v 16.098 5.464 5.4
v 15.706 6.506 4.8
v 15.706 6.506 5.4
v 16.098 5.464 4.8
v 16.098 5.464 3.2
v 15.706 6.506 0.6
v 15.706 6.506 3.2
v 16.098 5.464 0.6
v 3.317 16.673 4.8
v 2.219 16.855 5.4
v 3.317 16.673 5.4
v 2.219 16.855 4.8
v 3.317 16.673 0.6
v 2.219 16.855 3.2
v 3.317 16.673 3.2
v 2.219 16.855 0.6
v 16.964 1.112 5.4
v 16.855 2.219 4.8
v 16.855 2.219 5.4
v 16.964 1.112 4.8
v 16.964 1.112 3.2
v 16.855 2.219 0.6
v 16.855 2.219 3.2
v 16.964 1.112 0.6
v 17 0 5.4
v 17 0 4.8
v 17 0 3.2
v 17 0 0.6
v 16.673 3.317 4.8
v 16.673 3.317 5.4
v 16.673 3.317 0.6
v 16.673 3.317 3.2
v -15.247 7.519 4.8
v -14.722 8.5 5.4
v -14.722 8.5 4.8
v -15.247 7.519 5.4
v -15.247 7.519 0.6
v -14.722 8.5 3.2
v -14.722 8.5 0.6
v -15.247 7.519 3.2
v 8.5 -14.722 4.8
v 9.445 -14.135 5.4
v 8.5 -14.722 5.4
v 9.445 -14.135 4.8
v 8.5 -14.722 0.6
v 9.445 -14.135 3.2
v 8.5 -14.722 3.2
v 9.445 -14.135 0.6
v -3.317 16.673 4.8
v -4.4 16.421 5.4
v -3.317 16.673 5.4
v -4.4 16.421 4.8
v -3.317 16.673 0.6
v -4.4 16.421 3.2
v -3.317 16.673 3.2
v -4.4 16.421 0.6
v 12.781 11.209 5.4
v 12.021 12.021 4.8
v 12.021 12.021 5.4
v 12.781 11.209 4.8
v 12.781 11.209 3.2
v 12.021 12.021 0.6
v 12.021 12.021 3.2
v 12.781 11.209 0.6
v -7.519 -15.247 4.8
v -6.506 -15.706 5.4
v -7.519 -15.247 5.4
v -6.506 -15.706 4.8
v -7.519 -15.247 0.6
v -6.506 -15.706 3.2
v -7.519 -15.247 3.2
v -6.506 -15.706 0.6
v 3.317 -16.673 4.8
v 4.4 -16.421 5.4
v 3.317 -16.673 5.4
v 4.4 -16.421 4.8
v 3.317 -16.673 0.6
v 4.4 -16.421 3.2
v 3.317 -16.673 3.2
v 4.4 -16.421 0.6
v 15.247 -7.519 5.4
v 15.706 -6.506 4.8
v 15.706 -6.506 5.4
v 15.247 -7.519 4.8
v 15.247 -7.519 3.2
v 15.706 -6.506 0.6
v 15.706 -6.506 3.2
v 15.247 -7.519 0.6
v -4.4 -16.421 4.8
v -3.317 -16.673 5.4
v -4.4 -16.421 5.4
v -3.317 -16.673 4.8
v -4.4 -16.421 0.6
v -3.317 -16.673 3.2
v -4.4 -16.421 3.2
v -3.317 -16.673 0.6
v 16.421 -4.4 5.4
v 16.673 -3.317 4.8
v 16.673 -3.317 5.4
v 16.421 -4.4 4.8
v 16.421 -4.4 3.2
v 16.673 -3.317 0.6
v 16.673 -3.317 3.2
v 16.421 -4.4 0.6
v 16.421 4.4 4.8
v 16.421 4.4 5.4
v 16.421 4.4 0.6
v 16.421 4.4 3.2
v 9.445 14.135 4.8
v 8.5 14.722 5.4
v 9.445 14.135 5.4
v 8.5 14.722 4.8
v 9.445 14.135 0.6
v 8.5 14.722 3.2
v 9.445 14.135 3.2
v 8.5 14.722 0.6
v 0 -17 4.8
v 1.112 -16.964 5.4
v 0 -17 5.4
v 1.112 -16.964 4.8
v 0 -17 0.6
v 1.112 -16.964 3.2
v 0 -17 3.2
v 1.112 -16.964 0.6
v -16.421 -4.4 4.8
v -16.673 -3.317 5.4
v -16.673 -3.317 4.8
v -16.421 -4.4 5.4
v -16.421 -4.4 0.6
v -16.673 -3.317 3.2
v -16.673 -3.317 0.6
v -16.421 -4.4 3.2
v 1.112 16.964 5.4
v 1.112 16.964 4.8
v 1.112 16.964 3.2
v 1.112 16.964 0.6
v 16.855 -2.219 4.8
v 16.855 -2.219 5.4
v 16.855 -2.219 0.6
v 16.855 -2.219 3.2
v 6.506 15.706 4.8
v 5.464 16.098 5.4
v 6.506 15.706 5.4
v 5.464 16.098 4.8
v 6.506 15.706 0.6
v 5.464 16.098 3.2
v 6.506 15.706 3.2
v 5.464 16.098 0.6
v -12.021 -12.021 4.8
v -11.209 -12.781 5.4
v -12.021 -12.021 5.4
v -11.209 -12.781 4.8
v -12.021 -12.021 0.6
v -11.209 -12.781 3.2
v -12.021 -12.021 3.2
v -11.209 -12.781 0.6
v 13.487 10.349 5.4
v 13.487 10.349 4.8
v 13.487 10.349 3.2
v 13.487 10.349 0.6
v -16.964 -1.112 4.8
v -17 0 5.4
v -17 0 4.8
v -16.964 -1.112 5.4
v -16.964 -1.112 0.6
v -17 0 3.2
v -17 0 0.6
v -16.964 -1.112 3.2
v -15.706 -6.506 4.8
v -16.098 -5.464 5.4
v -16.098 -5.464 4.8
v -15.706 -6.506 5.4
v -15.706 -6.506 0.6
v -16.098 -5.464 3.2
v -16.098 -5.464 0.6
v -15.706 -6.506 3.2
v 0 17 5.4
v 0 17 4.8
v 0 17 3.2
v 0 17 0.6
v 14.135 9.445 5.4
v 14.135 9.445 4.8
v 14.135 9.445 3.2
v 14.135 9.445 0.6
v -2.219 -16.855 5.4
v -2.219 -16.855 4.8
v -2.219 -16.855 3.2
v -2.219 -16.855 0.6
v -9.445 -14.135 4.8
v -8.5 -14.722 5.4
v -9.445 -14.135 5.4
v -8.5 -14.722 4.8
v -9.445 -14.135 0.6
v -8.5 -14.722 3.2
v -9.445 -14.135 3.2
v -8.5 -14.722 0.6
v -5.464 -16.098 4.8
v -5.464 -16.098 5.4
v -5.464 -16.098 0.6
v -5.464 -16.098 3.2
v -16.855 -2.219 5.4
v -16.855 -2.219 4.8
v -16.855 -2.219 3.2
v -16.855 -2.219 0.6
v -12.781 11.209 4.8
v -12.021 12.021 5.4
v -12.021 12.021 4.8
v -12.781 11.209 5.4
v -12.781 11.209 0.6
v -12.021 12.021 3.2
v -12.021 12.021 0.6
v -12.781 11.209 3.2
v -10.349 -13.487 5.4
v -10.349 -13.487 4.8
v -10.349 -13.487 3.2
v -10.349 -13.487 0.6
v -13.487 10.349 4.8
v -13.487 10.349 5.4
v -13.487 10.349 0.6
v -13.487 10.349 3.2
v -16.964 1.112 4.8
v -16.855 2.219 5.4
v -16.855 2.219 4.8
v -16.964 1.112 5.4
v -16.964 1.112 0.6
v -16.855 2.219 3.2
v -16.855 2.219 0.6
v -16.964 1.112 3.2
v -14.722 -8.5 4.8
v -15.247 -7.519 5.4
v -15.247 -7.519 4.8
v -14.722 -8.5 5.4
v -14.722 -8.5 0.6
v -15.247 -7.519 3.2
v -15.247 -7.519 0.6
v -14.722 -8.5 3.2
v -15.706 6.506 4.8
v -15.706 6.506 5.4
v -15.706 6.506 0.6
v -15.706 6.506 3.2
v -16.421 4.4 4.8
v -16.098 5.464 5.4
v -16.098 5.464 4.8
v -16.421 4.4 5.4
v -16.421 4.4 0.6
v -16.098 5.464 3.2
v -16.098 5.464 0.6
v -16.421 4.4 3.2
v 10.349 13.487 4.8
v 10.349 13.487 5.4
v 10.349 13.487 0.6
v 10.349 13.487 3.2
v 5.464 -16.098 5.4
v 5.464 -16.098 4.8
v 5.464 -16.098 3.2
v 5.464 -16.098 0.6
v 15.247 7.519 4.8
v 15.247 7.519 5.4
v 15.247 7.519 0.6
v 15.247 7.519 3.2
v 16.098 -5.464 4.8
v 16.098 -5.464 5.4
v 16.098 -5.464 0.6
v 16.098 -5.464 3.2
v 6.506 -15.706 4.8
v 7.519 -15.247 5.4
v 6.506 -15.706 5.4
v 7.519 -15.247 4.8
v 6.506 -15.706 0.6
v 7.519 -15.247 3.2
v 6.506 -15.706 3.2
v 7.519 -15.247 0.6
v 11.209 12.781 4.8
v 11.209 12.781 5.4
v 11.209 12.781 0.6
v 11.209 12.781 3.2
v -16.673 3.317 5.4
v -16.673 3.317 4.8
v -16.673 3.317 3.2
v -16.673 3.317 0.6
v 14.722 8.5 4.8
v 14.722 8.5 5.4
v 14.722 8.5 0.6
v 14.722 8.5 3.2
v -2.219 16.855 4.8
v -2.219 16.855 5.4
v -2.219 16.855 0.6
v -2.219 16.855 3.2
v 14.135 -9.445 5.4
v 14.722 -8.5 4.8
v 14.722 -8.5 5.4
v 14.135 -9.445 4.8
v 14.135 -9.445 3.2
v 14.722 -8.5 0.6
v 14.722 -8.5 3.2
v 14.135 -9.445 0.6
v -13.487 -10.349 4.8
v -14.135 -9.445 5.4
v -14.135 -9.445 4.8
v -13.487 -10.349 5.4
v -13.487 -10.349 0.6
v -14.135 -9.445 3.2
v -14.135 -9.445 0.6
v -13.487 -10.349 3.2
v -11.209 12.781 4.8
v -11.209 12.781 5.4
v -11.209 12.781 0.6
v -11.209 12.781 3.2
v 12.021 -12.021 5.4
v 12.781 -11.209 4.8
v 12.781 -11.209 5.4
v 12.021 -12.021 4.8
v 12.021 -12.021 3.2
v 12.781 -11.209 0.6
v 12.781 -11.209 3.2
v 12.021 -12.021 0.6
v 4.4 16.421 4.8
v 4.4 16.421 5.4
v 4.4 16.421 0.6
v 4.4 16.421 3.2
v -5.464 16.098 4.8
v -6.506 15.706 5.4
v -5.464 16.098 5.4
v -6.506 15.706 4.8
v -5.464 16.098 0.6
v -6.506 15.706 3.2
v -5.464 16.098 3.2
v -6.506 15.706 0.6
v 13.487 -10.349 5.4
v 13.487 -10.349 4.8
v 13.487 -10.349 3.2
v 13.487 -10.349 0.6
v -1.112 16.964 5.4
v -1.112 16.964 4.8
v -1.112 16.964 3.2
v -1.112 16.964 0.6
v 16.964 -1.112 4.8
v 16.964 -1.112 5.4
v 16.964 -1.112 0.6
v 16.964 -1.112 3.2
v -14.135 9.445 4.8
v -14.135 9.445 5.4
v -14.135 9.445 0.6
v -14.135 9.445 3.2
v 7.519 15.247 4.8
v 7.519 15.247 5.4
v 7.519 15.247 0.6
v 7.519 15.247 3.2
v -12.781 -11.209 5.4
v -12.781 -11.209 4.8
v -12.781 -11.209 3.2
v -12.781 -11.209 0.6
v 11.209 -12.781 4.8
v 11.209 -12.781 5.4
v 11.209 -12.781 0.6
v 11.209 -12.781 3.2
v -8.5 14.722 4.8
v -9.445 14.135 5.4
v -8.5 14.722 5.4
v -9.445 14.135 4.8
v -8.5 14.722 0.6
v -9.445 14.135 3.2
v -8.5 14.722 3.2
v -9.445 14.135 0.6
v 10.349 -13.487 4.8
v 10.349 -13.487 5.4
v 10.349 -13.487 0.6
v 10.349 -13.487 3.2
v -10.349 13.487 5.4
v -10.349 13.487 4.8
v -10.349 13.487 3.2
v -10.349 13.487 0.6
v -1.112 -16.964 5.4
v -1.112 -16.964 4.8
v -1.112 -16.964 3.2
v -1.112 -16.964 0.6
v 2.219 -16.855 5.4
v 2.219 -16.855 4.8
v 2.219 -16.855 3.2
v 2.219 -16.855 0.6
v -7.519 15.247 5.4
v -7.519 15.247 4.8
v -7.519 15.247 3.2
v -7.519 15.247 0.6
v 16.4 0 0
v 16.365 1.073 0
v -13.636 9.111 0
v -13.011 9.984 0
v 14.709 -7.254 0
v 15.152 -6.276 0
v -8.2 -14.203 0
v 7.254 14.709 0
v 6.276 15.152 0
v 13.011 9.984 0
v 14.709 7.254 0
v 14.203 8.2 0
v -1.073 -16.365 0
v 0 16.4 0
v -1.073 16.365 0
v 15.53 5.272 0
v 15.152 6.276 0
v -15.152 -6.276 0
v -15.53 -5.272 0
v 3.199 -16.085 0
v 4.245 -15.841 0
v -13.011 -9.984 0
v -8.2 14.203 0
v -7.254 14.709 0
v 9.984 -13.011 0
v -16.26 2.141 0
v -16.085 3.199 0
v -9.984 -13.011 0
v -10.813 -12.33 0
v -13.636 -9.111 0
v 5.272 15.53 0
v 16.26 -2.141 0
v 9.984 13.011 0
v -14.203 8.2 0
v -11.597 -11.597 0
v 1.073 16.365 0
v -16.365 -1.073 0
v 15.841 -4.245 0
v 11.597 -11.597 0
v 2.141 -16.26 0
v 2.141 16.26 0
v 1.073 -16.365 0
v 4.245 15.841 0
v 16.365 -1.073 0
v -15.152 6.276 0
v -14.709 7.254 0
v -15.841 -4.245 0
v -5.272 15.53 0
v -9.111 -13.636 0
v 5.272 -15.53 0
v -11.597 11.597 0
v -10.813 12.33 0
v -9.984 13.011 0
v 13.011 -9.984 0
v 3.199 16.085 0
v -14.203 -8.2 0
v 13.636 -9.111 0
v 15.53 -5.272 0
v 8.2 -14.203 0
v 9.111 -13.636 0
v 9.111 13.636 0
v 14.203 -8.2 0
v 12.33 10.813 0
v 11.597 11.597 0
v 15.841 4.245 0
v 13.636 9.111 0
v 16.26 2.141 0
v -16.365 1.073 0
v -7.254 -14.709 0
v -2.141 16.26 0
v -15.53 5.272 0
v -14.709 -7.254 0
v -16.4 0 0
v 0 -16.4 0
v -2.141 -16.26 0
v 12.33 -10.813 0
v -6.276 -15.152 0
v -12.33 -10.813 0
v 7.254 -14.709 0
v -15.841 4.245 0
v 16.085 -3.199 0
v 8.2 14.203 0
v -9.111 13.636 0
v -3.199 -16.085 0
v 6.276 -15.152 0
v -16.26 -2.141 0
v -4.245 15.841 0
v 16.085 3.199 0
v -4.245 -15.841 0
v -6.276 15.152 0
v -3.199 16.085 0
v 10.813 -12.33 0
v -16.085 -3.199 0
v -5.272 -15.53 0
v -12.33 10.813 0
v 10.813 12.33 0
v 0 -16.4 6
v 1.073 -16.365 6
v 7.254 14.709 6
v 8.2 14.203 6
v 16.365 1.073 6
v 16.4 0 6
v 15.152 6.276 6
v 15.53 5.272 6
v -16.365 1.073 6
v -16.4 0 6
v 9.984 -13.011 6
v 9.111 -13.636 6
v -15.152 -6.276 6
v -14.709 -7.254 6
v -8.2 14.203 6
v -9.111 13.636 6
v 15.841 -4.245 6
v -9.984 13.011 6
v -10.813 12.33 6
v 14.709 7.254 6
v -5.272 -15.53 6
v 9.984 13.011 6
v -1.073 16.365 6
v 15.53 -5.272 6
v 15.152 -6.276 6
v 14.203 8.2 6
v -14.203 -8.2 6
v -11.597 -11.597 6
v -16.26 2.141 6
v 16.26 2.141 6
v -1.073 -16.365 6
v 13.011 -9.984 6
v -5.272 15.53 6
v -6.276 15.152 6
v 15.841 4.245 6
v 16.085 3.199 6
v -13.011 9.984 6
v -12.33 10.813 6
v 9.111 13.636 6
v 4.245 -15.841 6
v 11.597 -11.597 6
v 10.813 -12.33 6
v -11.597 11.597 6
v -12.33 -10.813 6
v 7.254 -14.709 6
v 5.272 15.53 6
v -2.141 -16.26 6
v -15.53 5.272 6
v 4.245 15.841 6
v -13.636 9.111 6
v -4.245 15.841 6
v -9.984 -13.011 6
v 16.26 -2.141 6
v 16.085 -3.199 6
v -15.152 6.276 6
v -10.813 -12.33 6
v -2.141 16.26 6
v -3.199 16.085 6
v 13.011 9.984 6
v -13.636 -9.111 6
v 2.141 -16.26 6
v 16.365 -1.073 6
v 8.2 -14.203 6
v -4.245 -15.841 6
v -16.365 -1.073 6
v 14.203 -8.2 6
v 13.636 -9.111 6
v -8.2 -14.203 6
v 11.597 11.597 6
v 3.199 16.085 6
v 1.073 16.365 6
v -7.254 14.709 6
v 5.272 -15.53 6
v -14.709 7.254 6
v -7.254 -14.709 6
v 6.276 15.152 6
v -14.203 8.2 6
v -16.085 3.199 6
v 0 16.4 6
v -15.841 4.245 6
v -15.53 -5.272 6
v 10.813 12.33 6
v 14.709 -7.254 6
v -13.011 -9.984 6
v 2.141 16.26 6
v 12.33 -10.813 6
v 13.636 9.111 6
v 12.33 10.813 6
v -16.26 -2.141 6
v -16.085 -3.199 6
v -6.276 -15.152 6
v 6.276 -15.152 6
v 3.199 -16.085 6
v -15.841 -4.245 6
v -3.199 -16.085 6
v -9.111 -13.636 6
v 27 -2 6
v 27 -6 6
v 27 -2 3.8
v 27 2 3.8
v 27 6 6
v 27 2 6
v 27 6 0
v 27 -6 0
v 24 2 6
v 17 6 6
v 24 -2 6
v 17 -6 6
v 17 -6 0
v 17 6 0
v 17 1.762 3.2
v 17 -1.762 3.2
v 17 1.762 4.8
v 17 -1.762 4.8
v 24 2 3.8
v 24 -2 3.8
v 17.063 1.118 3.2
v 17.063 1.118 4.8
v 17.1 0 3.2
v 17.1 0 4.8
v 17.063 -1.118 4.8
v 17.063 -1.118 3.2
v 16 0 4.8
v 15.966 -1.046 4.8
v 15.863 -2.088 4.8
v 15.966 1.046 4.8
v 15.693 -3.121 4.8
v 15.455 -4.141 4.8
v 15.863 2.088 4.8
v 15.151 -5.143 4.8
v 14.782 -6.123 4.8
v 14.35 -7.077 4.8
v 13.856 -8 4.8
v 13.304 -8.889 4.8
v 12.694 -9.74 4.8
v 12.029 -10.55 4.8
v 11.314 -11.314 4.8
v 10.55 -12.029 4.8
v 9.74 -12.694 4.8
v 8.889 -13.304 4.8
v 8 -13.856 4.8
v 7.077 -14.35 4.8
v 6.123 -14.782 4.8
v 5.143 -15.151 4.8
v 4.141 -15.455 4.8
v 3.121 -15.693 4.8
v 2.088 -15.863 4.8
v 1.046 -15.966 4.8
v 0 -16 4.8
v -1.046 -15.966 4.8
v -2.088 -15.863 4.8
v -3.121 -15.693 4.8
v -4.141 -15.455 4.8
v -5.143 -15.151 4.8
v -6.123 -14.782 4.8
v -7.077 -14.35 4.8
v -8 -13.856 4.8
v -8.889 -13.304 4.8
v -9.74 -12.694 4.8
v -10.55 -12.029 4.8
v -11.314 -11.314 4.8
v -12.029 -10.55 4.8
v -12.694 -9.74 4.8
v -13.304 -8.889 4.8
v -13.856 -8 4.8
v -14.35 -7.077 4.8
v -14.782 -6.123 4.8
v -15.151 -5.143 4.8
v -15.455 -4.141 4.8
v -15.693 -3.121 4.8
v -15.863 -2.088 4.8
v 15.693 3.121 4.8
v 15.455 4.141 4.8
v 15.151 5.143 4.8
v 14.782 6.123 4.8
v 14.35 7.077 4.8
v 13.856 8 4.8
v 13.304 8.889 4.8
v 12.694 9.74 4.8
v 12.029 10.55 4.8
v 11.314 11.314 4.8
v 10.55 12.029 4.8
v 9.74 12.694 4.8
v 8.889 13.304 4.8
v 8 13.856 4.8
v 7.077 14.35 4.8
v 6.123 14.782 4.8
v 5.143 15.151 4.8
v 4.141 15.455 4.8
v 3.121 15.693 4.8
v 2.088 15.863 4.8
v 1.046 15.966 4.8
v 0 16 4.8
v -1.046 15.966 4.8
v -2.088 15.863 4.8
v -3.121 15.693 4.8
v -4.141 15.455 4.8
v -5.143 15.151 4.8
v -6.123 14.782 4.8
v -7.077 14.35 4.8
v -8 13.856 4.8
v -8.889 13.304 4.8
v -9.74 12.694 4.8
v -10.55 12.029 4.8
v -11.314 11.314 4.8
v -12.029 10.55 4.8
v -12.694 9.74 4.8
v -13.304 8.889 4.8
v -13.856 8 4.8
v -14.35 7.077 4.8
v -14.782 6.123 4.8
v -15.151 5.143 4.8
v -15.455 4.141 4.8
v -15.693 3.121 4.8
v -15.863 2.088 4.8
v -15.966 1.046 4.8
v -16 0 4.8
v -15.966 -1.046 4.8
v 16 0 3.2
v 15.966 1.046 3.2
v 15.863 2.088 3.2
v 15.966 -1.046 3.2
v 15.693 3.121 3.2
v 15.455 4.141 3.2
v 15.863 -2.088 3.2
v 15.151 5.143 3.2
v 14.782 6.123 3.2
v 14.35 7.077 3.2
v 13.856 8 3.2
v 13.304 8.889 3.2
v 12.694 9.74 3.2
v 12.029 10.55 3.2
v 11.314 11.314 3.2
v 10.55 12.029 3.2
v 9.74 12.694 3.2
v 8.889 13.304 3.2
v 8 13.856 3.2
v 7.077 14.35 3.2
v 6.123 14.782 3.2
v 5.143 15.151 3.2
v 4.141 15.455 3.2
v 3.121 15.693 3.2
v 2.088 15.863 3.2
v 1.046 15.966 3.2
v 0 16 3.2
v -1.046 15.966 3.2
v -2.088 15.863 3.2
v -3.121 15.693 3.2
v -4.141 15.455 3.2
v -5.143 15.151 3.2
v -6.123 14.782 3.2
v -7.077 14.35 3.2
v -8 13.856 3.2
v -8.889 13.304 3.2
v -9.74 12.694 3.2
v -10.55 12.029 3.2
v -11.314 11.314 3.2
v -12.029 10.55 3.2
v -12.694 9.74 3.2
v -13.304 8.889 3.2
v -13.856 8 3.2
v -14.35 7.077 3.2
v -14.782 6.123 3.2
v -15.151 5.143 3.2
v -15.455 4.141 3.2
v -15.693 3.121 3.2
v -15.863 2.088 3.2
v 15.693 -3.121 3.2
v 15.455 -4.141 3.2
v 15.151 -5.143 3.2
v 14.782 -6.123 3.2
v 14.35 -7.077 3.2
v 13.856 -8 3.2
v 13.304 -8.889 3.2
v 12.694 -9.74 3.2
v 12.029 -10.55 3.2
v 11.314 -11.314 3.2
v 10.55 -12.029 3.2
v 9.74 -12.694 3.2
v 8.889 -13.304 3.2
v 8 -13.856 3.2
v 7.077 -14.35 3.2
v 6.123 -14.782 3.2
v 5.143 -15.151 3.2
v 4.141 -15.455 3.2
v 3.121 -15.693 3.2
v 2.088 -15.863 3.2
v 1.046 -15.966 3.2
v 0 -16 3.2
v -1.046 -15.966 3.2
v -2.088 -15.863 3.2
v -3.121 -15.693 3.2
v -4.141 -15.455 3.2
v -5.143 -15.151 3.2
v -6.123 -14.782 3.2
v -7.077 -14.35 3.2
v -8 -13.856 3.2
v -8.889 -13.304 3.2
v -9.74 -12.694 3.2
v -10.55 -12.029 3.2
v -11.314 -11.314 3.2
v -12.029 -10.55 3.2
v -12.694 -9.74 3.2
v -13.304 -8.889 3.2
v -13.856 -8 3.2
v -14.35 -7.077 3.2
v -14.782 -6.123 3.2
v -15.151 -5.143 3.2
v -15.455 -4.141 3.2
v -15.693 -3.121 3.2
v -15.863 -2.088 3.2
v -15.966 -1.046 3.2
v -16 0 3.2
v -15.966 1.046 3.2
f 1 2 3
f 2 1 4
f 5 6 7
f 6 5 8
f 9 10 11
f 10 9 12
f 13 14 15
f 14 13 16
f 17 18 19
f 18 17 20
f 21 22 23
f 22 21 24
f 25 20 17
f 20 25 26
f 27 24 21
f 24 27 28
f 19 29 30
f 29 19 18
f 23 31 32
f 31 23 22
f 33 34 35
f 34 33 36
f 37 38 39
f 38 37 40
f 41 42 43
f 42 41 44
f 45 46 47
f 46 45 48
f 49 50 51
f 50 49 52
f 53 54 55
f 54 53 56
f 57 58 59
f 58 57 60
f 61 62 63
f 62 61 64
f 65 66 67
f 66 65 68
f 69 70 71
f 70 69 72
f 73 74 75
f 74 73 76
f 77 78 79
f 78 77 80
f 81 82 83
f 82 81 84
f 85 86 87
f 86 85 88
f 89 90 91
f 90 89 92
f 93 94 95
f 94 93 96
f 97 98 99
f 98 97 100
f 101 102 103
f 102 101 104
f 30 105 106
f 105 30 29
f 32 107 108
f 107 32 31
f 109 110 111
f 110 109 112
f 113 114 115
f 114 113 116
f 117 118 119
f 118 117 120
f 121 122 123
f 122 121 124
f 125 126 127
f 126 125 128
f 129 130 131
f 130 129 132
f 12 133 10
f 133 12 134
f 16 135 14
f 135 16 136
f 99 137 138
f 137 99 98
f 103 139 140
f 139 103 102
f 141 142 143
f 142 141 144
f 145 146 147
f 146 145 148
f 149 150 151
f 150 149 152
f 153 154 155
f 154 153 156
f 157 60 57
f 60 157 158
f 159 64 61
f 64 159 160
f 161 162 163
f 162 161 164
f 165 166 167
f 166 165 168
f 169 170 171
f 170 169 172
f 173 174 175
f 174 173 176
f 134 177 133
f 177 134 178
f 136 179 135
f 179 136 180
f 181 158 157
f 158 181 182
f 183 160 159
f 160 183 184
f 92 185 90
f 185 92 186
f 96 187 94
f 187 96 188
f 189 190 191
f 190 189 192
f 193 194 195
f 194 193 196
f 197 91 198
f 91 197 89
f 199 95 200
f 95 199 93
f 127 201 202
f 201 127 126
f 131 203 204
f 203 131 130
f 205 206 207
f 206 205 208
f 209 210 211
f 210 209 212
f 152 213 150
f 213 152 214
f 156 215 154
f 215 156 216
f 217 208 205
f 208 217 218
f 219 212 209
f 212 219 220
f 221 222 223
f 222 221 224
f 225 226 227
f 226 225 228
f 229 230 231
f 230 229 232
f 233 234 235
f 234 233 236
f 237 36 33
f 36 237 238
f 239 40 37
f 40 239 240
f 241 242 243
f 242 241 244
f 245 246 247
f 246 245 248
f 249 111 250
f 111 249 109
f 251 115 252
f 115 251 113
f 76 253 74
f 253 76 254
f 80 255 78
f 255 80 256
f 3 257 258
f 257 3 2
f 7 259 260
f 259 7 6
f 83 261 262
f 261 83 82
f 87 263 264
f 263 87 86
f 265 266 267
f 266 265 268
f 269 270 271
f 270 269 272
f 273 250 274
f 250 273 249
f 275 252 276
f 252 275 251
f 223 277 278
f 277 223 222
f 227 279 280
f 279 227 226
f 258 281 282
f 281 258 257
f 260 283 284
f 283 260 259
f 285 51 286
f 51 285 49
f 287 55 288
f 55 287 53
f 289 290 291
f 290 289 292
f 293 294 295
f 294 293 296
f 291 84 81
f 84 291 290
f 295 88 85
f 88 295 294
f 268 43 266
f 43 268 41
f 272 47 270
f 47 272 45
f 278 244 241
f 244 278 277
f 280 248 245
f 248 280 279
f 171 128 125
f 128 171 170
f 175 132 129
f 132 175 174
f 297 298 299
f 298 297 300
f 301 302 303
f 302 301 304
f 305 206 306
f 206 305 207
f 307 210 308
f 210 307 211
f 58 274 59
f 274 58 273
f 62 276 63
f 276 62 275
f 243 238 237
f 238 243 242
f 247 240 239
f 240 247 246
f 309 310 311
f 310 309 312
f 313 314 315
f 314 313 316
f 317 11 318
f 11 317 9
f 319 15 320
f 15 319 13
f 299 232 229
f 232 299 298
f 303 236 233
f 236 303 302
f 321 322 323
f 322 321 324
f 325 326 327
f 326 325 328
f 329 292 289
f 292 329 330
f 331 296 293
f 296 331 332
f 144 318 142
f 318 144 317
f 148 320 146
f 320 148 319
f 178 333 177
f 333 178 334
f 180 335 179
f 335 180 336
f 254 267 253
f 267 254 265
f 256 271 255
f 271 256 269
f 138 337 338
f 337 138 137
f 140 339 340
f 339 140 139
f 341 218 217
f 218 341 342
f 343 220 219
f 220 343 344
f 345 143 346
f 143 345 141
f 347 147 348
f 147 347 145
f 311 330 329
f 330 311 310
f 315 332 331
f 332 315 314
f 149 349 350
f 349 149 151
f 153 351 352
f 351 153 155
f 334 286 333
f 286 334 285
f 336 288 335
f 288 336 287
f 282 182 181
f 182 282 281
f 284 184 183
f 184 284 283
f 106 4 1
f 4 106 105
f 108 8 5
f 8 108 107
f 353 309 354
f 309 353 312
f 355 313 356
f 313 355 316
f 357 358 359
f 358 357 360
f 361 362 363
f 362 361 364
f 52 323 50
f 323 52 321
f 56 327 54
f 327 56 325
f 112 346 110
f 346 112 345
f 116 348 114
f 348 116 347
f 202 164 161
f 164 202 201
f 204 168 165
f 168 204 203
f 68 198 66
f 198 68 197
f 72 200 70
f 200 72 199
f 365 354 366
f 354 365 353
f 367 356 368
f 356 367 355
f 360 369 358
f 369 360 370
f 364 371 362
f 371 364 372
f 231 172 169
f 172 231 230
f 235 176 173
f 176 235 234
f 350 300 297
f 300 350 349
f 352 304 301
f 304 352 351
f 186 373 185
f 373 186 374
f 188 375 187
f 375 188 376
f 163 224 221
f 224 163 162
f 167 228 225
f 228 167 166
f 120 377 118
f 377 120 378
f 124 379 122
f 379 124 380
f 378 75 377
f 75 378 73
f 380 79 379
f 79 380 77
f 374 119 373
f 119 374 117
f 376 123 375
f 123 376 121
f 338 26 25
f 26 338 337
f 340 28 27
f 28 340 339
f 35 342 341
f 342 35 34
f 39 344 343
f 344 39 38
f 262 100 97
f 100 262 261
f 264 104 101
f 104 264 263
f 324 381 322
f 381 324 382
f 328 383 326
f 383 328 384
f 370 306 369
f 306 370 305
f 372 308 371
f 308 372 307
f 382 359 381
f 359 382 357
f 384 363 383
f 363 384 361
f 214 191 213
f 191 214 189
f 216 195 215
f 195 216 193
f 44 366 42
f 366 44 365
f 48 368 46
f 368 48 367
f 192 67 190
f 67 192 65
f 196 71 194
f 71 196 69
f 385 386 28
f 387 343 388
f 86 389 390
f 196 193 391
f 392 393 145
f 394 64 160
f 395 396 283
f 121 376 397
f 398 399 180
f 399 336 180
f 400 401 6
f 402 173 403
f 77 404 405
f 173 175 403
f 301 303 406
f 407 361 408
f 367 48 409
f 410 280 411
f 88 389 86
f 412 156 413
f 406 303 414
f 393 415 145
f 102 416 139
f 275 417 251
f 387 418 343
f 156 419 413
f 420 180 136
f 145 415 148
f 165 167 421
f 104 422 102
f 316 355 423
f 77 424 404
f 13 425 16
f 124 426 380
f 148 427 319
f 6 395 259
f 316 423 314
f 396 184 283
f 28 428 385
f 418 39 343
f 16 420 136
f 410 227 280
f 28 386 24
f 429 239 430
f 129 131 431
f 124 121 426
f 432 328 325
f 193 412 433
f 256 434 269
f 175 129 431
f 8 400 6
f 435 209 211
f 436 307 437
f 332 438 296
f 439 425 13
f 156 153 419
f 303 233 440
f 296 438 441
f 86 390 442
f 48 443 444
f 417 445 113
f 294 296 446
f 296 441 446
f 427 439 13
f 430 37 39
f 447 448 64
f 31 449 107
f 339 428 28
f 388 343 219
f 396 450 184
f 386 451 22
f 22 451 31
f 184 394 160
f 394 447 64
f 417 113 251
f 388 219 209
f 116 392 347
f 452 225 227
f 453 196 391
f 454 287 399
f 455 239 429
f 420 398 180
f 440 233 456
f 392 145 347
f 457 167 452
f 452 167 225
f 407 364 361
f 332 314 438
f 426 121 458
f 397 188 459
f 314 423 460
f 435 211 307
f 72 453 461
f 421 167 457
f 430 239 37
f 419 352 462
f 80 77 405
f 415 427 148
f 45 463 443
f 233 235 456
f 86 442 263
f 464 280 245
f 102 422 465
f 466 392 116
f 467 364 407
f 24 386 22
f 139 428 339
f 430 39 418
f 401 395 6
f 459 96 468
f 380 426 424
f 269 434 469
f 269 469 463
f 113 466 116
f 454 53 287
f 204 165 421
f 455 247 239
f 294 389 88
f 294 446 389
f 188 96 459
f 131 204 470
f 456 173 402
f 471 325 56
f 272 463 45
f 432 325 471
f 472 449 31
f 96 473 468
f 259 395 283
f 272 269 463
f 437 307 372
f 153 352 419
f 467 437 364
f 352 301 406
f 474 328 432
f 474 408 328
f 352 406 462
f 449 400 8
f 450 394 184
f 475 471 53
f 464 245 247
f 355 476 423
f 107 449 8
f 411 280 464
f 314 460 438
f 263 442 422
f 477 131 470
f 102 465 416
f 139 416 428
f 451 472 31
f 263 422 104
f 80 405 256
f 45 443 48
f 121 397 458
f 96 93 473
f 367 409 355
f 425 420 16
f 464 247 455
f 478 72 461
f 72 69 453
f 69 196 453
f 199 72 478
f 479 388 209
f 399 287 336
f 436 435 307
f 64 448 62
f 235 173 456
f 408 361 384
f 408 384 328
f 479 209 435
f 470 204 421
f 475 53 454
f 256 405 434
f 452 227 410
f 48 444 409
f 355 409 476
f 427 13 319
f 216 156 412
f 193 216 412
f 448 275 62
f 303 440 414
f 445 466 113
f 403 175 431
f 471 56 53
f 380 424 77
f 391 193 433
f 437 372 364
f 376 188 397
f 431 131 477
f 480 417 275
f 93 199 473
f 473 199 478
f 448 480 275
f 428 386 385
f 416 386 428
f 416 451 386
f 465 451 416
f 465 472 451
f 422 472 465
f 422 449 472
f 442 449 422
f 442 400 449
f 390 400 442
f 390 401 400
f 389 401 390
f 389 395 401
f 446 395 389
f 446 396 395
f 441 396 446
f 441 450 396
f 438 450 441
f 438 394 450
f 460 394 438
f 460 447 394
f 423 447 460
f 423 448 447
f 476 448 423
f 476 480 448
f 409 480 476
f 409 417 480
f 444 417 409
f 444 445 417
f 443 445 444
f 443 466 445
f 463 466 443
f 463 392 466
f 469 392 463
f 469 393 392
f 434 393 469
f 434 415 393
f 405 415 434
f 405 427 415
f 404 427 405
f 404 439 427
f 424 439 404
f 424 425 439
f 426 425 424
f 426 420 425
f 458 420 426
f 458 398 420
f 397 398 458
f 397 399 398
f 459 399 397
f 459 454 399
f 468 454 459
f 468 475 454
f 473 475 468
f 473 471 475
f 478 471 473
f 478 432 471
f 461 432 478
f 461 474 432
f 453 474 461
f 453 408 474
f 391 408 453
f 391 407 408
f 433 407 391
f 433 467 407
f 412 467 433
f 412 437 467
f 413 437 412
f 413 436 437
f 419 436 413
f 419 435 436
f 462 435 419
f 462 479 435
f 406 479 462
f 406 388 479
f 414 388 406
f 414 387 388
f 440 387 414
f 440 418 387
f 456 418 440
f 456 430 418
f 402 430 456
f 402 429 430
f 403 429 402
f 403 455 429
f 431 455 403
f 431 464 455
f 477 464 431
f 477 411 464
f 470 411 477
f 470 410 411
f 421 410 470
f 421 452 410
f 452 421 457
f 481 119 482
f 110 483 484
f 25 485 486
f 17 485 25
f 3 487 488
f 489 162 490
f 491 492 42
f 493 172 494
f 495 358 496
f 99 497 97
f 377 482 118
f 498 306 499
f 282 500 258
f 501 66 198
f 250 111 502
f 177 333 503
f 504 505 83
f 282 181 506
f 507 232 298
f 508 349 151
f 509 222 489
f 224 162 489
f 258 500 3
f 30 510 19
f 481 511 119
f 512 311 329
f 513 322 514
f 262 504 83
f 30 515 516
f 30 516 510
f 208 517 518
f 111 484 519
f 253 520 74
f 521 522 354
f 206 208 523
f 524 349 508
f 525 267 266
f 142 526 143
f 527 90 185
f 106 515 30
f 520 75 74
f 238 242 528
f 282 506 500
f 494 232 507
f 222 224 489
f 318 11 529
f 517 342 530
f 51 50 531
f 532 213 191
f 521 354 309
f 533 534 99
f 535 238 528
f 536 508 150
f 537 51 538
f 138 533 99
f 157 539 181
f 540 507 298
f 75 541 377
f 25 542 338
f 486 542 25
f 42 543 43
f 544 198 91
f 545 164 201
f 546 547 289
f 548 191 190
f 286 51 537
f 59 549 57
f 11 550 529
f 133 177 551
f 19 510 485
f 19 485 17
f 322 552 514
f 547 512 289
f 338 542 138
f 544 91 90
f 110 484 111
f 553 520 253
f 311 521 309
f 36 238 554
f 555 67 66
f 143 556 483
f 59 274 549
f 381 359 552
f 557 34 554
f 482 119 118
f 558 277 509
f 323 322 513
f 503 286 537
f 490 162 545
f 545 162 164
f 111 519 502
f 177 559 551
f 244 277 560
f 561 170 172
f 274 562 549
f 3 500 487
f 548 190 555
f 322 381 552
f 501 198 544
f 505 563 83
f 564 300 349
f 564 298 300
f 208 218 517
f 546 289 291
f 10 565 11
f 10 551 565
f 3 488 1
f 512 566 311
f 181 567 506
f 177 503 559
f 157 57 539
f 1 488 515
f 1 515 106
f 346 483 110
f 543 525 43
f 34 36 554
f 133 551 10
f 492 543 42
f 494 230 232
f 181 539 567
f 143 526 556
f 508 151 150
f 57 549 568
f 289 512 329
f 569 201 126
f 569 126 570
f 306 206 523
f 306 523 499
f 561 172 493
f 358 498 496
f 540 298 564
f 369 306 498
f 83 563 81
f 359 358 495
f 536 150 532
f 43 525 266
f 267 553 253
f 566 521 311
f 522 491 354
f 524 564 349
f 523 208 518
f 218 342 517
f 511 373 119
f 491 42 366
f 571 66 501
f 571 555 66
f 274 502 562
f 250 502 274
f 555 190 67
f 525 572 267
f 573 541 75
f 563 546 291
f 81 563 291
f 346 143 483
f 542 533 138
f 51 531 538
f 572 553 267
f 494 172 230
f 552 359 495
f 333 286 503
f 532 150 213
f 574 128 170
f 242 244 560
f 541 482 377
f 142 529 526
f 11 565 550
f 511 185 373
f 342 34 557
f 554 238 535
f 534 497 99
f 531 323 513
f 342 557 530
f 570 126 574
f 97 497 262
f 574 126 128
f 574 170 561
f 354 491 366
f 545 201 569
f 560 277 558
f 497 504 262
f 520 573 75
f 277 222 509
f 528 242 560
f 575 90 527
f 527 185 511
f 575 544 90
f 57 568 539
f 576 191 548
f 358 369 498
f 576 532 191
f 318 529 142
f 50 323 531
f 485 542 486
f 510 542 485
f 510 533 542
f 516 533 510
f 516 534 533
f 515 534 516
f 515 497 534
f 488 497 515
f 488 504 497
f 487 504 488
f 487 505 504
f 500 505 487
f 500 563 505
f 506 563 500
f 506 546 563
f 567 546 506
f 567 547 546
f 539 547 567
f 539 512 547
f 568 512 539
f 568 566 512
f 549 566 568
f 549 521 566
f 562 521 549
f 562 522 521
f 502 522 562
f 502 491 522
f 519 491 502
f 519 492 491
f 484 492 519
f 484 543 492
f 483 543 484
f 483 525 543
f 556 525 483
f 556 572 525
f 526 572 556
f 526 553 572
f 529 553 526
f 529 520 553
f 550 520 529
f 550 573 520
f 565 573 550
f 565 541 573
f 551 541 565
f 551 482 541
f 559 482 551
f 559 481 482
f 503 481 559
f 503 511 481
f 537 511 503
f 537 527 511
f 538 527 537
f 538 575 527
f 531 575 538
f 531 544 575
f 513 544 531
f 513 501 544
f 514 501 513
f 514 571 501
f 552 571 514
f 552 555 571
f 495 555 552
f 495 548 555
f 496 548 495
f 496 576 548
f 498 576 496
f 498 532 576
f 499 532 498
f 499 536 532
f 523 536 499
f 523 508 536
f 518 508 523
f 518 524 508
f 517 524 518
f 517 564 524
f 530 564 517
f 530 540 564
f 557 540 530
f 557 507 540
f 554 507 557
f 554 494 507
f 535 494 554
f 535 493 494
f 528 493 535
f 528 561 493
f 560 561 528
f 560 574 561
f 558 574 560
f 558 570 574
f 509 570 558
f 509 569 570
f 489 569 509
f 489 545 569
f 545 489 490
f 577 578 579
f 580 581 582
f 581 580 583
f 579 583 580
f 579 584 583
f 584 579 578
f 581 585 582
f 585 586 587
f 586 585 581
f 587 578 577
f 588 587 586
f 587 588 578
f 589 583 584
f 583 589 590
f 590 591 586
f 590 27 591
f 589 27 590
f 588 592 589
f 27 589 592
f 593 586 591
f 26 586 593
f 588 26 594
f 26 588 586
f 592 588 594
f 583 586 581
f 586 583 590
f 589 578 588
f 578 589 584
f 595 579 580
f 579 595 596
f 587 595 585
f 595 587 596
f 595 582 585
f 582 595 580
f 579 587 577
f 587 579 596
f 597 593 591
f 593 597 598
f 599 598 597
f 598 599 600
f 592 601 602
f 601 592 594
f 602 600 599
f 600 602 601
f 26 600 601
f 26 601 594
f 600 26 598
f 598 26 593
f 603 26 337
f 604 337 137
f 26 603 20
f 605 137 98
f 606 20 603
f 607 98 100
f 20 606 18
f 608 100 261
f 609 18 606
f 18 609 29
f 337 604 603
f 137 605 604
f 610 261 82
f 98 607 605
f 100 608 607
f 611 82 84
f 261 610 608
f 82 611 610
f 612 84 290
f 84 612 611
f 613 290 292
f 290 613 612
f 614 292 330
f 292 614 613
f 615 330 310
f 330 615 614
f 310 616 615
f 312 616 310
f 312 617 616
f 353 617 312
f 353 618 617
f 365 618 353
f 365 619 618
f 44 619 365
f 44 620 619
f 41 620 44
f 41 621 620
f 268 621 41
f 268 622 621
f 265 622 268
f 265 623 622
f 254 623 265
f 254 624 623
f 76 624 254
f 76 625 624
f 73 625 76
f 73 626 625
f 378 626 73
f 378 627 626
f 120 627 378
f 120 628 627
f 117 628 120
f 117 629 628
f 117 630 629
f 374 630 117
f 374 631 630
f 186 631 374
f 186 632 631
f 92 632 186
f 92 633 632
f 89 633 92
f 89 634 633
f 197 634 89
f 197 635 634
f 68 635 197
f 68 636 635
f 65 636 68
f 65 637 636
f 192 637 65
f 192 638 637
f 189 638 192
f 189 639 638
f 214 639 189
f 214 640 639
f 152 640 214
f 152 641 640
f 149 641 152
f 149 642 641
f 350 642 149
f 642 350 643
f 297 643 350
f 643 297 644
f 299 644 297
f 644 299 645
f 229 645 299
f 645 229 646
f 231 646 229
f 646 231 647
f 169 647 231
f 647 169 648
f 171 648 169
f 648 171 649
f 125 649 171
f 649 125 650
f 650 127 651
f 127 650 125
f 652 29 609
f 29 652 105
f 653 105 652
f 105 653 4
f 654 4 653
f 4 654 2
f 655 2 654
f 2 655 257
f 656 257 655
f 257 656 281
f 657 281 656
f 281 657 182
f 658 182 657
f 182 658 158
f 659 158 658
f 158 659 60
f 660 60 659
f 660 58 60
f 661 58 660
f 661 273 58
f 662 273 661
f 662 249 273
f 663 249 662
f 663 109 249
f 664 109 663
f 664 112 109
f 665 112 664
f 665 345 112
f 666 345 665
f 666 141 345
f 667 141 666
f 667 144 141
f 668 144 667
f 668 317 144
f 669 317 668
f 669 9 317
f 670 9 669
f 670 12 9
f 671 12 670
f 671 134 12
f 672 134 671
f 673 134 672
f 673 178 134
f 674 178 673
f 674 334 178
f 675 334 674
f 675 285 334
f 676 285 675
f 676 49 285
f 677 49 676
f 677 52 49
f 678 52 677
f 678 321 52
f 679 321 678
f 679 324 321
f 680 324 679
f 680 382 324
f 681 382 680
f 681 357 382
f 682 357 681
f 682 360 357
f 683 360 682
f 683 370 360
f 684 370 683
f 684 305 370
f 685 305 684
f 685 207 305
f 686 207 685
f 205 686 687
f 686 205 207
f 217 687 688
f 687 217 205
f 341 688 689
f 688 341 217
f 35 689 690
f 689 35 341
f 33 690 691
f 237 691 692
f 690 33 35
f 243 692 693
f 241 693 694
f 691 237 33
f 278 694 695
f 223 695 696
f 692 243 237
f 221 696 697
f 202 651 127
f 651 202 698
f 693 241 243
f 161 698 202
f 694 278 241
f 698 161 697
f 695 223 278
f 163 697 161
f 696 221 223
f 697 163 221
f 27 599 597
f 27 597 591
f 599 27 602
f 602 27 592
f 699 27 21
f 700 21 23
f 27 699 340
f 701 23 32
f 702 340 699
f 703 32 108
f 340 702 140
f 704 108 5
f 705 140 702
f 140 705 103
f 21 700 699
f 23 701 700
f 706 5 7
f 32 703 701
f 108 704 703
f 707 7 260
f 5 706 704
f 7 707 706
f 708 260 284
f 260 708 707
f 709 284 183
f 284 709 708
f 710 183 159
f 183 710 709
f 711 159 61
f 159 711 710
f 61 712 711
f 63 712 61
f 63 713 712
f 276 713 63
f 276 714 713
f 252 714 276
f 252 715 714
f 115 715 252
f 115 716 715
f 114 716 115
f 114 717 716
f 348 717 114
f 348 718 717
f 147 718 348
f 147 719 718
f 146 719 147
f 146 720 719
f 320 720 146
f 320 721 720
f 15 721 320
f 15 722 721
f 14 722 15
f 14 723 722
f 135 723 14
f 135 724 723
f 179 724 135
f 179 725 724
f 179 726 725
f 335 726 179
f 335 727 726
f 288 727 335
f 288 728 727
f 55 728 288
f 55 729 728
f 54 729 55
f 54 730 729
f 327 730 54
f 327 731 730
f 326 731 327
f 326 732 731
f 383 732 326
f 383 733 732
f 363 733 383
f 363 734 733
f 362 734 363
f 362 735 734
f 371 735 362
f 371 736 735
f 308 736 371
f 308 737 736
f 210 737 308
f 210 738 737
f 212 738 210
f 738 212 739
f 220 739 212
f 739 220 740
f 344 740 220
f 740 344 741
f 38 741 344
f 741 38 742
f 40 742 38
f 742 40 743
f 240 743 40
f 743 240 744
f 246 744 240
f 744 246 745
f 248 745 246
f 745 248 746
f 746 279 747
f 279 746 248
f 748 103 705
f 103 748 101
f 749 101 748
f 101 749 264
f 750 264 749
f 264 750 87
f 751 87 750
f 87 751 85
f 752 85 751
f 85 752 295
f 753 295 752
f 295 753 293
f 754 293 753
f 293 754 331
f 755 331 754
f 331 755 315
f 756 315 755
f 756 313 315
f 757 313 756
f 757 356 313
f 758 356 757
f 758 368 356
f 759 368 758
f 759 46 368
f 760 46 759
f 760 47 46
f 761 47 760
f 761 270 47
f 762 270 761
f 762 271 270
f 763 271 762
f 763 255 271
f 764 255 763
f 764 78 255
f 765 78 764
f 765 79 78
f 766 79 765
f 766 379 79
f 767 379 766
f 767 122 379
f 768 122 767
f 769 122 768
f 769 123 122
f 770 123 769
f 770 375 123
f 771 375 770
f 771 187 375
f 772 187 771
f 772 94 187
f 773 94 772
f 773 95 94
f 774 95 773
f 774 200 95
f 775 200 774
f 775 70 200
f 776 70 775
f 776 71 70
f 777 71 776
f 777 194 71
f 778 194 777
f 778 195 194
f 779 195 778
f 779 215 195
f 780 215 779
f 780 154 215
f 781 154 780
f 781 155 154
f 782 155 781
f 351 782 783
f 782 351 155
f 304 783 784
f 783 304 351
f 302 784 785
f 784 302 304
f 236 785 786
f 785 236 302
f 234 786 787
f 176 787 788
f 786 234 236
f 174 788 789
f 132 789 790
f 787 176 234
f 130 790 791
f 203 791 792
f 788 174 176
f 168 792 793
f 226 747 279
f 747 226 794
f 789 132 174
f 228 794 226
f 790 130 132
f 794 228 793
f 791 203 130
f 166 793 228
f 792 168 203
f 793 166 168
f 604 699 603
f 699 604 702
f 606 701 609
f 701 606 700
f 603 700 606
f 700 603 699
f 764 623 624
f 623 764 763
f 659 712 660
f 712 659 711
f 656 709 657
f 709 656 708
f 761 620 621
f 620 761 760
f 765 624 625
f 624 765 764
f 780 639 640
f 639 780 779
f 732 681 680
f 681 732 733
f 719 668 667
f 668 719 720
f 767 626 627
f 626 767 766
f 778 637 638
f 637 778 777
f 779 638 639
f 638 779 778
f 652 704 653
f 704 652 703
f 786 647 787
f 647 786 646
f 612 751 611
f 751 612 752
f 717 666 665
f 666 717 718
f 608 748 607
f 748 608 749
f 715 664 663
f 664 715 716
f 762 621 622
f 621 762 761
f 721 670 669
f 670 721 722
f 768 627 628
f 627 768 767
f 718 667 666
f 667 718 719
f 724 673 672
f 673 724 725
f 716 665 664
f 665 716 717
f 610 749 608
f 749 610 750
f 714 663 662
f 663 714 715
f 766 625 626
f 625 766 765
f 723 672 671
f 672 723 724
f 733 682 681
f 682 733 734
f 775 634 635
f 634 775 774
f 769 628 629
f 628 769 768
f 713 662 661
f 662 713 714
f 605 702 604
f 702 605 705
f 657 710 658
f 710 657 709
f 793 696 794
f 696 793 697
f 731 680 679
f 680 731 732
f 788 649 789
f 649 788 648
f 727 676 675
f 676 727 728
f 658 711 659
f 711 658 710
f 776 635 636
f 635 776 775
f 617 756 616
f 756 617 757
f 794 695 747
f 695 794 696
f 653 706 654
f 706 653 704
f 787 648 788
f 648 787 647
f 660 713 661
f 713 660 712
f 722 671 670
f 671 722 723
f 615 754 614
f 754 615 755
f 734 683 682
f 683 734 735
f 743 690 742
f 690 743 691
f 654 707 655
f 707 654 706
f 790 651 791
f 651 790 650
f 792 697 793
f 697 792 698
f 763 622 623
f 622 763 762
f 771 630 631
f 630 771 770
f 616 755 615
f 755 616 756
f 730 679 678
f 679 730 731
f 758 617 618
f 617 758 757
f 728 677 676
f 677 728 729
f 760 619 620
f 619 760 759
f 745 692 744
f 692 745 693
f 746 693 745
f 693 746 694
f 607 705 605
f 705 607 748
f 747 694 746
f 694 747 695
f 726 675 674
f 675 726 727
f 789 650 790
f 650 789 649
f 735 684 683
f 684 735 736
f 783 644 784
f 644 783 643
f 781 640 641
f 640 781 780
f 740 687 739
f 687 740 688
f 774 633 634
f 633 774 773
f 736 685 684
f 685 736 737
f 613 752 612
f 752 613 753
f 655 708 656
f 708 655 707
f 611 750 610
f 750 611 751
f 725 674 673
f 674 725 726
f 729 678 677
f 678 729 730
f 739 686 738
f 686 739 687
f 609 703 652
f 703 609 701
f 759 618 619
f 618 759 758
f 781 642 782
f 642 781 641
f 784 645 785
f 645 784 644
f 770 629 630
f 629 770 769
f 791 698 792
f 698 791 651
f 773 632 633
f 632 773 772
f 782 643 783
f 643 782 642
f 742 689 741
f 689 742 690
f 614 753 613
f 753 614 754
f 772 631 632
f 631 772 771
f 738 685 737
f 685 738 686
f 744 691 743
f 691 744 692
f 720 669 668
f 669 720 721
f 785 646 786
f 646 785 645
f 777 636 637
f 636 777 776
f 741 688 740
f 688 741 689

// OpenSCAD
$fn=96;

outer_d = 34;
h = 6.0;

chamfer = 0.6;

groove_from_top = 1.2;
groove_w = 1.6;
groove_depth = 1.0;

lug_len = 10.0;
lug_w = 12.0;
lug_h = h;

notch_w = 4.0;
notch_len = 3.0;
notch_h = 2.2;

module chamfered_cylinder(d=34, h=6, c=0.6) {
    union() {
        translate([0,0,c]) cylinder(d=d, h=h-2*c);
        cylinder(d1=d-2*c, d2=d, h=c);
        translate([0,0,h-c]) cylinder(d1=d, d2=d-2*c, h=c);
    }
}

module sleeve_body() {
    chamfered_cylinder(d=outer_d, h=h, c=chamfer);
}

module circumferential_groove() {
    translate([0,0,h-groove_from_top-groove_w])
        difference() {
            cylinder(d=outer_d+0.2, h=groove_w);
            cylinder(d=outer_d-2*groove_depth, h=groove_w+0.2);
        }
}

module lug_with_notch() {
    difference() {
        translate([outer_d/2, -lug_w/2, 0])
            cube([lug_len, lug_w, lug_h], center=false);

        translate([outer_d/2 + lug_len - notch_len, -notch_w/2, h - notch_h])
            cube([notch_len+0.2, notch_w, notch_h+0.2], center=false);
    }
}

difference() {
    union() {
        sleeve_body();
        lug_with_notch();
    }
    circumferential_groove();
}
